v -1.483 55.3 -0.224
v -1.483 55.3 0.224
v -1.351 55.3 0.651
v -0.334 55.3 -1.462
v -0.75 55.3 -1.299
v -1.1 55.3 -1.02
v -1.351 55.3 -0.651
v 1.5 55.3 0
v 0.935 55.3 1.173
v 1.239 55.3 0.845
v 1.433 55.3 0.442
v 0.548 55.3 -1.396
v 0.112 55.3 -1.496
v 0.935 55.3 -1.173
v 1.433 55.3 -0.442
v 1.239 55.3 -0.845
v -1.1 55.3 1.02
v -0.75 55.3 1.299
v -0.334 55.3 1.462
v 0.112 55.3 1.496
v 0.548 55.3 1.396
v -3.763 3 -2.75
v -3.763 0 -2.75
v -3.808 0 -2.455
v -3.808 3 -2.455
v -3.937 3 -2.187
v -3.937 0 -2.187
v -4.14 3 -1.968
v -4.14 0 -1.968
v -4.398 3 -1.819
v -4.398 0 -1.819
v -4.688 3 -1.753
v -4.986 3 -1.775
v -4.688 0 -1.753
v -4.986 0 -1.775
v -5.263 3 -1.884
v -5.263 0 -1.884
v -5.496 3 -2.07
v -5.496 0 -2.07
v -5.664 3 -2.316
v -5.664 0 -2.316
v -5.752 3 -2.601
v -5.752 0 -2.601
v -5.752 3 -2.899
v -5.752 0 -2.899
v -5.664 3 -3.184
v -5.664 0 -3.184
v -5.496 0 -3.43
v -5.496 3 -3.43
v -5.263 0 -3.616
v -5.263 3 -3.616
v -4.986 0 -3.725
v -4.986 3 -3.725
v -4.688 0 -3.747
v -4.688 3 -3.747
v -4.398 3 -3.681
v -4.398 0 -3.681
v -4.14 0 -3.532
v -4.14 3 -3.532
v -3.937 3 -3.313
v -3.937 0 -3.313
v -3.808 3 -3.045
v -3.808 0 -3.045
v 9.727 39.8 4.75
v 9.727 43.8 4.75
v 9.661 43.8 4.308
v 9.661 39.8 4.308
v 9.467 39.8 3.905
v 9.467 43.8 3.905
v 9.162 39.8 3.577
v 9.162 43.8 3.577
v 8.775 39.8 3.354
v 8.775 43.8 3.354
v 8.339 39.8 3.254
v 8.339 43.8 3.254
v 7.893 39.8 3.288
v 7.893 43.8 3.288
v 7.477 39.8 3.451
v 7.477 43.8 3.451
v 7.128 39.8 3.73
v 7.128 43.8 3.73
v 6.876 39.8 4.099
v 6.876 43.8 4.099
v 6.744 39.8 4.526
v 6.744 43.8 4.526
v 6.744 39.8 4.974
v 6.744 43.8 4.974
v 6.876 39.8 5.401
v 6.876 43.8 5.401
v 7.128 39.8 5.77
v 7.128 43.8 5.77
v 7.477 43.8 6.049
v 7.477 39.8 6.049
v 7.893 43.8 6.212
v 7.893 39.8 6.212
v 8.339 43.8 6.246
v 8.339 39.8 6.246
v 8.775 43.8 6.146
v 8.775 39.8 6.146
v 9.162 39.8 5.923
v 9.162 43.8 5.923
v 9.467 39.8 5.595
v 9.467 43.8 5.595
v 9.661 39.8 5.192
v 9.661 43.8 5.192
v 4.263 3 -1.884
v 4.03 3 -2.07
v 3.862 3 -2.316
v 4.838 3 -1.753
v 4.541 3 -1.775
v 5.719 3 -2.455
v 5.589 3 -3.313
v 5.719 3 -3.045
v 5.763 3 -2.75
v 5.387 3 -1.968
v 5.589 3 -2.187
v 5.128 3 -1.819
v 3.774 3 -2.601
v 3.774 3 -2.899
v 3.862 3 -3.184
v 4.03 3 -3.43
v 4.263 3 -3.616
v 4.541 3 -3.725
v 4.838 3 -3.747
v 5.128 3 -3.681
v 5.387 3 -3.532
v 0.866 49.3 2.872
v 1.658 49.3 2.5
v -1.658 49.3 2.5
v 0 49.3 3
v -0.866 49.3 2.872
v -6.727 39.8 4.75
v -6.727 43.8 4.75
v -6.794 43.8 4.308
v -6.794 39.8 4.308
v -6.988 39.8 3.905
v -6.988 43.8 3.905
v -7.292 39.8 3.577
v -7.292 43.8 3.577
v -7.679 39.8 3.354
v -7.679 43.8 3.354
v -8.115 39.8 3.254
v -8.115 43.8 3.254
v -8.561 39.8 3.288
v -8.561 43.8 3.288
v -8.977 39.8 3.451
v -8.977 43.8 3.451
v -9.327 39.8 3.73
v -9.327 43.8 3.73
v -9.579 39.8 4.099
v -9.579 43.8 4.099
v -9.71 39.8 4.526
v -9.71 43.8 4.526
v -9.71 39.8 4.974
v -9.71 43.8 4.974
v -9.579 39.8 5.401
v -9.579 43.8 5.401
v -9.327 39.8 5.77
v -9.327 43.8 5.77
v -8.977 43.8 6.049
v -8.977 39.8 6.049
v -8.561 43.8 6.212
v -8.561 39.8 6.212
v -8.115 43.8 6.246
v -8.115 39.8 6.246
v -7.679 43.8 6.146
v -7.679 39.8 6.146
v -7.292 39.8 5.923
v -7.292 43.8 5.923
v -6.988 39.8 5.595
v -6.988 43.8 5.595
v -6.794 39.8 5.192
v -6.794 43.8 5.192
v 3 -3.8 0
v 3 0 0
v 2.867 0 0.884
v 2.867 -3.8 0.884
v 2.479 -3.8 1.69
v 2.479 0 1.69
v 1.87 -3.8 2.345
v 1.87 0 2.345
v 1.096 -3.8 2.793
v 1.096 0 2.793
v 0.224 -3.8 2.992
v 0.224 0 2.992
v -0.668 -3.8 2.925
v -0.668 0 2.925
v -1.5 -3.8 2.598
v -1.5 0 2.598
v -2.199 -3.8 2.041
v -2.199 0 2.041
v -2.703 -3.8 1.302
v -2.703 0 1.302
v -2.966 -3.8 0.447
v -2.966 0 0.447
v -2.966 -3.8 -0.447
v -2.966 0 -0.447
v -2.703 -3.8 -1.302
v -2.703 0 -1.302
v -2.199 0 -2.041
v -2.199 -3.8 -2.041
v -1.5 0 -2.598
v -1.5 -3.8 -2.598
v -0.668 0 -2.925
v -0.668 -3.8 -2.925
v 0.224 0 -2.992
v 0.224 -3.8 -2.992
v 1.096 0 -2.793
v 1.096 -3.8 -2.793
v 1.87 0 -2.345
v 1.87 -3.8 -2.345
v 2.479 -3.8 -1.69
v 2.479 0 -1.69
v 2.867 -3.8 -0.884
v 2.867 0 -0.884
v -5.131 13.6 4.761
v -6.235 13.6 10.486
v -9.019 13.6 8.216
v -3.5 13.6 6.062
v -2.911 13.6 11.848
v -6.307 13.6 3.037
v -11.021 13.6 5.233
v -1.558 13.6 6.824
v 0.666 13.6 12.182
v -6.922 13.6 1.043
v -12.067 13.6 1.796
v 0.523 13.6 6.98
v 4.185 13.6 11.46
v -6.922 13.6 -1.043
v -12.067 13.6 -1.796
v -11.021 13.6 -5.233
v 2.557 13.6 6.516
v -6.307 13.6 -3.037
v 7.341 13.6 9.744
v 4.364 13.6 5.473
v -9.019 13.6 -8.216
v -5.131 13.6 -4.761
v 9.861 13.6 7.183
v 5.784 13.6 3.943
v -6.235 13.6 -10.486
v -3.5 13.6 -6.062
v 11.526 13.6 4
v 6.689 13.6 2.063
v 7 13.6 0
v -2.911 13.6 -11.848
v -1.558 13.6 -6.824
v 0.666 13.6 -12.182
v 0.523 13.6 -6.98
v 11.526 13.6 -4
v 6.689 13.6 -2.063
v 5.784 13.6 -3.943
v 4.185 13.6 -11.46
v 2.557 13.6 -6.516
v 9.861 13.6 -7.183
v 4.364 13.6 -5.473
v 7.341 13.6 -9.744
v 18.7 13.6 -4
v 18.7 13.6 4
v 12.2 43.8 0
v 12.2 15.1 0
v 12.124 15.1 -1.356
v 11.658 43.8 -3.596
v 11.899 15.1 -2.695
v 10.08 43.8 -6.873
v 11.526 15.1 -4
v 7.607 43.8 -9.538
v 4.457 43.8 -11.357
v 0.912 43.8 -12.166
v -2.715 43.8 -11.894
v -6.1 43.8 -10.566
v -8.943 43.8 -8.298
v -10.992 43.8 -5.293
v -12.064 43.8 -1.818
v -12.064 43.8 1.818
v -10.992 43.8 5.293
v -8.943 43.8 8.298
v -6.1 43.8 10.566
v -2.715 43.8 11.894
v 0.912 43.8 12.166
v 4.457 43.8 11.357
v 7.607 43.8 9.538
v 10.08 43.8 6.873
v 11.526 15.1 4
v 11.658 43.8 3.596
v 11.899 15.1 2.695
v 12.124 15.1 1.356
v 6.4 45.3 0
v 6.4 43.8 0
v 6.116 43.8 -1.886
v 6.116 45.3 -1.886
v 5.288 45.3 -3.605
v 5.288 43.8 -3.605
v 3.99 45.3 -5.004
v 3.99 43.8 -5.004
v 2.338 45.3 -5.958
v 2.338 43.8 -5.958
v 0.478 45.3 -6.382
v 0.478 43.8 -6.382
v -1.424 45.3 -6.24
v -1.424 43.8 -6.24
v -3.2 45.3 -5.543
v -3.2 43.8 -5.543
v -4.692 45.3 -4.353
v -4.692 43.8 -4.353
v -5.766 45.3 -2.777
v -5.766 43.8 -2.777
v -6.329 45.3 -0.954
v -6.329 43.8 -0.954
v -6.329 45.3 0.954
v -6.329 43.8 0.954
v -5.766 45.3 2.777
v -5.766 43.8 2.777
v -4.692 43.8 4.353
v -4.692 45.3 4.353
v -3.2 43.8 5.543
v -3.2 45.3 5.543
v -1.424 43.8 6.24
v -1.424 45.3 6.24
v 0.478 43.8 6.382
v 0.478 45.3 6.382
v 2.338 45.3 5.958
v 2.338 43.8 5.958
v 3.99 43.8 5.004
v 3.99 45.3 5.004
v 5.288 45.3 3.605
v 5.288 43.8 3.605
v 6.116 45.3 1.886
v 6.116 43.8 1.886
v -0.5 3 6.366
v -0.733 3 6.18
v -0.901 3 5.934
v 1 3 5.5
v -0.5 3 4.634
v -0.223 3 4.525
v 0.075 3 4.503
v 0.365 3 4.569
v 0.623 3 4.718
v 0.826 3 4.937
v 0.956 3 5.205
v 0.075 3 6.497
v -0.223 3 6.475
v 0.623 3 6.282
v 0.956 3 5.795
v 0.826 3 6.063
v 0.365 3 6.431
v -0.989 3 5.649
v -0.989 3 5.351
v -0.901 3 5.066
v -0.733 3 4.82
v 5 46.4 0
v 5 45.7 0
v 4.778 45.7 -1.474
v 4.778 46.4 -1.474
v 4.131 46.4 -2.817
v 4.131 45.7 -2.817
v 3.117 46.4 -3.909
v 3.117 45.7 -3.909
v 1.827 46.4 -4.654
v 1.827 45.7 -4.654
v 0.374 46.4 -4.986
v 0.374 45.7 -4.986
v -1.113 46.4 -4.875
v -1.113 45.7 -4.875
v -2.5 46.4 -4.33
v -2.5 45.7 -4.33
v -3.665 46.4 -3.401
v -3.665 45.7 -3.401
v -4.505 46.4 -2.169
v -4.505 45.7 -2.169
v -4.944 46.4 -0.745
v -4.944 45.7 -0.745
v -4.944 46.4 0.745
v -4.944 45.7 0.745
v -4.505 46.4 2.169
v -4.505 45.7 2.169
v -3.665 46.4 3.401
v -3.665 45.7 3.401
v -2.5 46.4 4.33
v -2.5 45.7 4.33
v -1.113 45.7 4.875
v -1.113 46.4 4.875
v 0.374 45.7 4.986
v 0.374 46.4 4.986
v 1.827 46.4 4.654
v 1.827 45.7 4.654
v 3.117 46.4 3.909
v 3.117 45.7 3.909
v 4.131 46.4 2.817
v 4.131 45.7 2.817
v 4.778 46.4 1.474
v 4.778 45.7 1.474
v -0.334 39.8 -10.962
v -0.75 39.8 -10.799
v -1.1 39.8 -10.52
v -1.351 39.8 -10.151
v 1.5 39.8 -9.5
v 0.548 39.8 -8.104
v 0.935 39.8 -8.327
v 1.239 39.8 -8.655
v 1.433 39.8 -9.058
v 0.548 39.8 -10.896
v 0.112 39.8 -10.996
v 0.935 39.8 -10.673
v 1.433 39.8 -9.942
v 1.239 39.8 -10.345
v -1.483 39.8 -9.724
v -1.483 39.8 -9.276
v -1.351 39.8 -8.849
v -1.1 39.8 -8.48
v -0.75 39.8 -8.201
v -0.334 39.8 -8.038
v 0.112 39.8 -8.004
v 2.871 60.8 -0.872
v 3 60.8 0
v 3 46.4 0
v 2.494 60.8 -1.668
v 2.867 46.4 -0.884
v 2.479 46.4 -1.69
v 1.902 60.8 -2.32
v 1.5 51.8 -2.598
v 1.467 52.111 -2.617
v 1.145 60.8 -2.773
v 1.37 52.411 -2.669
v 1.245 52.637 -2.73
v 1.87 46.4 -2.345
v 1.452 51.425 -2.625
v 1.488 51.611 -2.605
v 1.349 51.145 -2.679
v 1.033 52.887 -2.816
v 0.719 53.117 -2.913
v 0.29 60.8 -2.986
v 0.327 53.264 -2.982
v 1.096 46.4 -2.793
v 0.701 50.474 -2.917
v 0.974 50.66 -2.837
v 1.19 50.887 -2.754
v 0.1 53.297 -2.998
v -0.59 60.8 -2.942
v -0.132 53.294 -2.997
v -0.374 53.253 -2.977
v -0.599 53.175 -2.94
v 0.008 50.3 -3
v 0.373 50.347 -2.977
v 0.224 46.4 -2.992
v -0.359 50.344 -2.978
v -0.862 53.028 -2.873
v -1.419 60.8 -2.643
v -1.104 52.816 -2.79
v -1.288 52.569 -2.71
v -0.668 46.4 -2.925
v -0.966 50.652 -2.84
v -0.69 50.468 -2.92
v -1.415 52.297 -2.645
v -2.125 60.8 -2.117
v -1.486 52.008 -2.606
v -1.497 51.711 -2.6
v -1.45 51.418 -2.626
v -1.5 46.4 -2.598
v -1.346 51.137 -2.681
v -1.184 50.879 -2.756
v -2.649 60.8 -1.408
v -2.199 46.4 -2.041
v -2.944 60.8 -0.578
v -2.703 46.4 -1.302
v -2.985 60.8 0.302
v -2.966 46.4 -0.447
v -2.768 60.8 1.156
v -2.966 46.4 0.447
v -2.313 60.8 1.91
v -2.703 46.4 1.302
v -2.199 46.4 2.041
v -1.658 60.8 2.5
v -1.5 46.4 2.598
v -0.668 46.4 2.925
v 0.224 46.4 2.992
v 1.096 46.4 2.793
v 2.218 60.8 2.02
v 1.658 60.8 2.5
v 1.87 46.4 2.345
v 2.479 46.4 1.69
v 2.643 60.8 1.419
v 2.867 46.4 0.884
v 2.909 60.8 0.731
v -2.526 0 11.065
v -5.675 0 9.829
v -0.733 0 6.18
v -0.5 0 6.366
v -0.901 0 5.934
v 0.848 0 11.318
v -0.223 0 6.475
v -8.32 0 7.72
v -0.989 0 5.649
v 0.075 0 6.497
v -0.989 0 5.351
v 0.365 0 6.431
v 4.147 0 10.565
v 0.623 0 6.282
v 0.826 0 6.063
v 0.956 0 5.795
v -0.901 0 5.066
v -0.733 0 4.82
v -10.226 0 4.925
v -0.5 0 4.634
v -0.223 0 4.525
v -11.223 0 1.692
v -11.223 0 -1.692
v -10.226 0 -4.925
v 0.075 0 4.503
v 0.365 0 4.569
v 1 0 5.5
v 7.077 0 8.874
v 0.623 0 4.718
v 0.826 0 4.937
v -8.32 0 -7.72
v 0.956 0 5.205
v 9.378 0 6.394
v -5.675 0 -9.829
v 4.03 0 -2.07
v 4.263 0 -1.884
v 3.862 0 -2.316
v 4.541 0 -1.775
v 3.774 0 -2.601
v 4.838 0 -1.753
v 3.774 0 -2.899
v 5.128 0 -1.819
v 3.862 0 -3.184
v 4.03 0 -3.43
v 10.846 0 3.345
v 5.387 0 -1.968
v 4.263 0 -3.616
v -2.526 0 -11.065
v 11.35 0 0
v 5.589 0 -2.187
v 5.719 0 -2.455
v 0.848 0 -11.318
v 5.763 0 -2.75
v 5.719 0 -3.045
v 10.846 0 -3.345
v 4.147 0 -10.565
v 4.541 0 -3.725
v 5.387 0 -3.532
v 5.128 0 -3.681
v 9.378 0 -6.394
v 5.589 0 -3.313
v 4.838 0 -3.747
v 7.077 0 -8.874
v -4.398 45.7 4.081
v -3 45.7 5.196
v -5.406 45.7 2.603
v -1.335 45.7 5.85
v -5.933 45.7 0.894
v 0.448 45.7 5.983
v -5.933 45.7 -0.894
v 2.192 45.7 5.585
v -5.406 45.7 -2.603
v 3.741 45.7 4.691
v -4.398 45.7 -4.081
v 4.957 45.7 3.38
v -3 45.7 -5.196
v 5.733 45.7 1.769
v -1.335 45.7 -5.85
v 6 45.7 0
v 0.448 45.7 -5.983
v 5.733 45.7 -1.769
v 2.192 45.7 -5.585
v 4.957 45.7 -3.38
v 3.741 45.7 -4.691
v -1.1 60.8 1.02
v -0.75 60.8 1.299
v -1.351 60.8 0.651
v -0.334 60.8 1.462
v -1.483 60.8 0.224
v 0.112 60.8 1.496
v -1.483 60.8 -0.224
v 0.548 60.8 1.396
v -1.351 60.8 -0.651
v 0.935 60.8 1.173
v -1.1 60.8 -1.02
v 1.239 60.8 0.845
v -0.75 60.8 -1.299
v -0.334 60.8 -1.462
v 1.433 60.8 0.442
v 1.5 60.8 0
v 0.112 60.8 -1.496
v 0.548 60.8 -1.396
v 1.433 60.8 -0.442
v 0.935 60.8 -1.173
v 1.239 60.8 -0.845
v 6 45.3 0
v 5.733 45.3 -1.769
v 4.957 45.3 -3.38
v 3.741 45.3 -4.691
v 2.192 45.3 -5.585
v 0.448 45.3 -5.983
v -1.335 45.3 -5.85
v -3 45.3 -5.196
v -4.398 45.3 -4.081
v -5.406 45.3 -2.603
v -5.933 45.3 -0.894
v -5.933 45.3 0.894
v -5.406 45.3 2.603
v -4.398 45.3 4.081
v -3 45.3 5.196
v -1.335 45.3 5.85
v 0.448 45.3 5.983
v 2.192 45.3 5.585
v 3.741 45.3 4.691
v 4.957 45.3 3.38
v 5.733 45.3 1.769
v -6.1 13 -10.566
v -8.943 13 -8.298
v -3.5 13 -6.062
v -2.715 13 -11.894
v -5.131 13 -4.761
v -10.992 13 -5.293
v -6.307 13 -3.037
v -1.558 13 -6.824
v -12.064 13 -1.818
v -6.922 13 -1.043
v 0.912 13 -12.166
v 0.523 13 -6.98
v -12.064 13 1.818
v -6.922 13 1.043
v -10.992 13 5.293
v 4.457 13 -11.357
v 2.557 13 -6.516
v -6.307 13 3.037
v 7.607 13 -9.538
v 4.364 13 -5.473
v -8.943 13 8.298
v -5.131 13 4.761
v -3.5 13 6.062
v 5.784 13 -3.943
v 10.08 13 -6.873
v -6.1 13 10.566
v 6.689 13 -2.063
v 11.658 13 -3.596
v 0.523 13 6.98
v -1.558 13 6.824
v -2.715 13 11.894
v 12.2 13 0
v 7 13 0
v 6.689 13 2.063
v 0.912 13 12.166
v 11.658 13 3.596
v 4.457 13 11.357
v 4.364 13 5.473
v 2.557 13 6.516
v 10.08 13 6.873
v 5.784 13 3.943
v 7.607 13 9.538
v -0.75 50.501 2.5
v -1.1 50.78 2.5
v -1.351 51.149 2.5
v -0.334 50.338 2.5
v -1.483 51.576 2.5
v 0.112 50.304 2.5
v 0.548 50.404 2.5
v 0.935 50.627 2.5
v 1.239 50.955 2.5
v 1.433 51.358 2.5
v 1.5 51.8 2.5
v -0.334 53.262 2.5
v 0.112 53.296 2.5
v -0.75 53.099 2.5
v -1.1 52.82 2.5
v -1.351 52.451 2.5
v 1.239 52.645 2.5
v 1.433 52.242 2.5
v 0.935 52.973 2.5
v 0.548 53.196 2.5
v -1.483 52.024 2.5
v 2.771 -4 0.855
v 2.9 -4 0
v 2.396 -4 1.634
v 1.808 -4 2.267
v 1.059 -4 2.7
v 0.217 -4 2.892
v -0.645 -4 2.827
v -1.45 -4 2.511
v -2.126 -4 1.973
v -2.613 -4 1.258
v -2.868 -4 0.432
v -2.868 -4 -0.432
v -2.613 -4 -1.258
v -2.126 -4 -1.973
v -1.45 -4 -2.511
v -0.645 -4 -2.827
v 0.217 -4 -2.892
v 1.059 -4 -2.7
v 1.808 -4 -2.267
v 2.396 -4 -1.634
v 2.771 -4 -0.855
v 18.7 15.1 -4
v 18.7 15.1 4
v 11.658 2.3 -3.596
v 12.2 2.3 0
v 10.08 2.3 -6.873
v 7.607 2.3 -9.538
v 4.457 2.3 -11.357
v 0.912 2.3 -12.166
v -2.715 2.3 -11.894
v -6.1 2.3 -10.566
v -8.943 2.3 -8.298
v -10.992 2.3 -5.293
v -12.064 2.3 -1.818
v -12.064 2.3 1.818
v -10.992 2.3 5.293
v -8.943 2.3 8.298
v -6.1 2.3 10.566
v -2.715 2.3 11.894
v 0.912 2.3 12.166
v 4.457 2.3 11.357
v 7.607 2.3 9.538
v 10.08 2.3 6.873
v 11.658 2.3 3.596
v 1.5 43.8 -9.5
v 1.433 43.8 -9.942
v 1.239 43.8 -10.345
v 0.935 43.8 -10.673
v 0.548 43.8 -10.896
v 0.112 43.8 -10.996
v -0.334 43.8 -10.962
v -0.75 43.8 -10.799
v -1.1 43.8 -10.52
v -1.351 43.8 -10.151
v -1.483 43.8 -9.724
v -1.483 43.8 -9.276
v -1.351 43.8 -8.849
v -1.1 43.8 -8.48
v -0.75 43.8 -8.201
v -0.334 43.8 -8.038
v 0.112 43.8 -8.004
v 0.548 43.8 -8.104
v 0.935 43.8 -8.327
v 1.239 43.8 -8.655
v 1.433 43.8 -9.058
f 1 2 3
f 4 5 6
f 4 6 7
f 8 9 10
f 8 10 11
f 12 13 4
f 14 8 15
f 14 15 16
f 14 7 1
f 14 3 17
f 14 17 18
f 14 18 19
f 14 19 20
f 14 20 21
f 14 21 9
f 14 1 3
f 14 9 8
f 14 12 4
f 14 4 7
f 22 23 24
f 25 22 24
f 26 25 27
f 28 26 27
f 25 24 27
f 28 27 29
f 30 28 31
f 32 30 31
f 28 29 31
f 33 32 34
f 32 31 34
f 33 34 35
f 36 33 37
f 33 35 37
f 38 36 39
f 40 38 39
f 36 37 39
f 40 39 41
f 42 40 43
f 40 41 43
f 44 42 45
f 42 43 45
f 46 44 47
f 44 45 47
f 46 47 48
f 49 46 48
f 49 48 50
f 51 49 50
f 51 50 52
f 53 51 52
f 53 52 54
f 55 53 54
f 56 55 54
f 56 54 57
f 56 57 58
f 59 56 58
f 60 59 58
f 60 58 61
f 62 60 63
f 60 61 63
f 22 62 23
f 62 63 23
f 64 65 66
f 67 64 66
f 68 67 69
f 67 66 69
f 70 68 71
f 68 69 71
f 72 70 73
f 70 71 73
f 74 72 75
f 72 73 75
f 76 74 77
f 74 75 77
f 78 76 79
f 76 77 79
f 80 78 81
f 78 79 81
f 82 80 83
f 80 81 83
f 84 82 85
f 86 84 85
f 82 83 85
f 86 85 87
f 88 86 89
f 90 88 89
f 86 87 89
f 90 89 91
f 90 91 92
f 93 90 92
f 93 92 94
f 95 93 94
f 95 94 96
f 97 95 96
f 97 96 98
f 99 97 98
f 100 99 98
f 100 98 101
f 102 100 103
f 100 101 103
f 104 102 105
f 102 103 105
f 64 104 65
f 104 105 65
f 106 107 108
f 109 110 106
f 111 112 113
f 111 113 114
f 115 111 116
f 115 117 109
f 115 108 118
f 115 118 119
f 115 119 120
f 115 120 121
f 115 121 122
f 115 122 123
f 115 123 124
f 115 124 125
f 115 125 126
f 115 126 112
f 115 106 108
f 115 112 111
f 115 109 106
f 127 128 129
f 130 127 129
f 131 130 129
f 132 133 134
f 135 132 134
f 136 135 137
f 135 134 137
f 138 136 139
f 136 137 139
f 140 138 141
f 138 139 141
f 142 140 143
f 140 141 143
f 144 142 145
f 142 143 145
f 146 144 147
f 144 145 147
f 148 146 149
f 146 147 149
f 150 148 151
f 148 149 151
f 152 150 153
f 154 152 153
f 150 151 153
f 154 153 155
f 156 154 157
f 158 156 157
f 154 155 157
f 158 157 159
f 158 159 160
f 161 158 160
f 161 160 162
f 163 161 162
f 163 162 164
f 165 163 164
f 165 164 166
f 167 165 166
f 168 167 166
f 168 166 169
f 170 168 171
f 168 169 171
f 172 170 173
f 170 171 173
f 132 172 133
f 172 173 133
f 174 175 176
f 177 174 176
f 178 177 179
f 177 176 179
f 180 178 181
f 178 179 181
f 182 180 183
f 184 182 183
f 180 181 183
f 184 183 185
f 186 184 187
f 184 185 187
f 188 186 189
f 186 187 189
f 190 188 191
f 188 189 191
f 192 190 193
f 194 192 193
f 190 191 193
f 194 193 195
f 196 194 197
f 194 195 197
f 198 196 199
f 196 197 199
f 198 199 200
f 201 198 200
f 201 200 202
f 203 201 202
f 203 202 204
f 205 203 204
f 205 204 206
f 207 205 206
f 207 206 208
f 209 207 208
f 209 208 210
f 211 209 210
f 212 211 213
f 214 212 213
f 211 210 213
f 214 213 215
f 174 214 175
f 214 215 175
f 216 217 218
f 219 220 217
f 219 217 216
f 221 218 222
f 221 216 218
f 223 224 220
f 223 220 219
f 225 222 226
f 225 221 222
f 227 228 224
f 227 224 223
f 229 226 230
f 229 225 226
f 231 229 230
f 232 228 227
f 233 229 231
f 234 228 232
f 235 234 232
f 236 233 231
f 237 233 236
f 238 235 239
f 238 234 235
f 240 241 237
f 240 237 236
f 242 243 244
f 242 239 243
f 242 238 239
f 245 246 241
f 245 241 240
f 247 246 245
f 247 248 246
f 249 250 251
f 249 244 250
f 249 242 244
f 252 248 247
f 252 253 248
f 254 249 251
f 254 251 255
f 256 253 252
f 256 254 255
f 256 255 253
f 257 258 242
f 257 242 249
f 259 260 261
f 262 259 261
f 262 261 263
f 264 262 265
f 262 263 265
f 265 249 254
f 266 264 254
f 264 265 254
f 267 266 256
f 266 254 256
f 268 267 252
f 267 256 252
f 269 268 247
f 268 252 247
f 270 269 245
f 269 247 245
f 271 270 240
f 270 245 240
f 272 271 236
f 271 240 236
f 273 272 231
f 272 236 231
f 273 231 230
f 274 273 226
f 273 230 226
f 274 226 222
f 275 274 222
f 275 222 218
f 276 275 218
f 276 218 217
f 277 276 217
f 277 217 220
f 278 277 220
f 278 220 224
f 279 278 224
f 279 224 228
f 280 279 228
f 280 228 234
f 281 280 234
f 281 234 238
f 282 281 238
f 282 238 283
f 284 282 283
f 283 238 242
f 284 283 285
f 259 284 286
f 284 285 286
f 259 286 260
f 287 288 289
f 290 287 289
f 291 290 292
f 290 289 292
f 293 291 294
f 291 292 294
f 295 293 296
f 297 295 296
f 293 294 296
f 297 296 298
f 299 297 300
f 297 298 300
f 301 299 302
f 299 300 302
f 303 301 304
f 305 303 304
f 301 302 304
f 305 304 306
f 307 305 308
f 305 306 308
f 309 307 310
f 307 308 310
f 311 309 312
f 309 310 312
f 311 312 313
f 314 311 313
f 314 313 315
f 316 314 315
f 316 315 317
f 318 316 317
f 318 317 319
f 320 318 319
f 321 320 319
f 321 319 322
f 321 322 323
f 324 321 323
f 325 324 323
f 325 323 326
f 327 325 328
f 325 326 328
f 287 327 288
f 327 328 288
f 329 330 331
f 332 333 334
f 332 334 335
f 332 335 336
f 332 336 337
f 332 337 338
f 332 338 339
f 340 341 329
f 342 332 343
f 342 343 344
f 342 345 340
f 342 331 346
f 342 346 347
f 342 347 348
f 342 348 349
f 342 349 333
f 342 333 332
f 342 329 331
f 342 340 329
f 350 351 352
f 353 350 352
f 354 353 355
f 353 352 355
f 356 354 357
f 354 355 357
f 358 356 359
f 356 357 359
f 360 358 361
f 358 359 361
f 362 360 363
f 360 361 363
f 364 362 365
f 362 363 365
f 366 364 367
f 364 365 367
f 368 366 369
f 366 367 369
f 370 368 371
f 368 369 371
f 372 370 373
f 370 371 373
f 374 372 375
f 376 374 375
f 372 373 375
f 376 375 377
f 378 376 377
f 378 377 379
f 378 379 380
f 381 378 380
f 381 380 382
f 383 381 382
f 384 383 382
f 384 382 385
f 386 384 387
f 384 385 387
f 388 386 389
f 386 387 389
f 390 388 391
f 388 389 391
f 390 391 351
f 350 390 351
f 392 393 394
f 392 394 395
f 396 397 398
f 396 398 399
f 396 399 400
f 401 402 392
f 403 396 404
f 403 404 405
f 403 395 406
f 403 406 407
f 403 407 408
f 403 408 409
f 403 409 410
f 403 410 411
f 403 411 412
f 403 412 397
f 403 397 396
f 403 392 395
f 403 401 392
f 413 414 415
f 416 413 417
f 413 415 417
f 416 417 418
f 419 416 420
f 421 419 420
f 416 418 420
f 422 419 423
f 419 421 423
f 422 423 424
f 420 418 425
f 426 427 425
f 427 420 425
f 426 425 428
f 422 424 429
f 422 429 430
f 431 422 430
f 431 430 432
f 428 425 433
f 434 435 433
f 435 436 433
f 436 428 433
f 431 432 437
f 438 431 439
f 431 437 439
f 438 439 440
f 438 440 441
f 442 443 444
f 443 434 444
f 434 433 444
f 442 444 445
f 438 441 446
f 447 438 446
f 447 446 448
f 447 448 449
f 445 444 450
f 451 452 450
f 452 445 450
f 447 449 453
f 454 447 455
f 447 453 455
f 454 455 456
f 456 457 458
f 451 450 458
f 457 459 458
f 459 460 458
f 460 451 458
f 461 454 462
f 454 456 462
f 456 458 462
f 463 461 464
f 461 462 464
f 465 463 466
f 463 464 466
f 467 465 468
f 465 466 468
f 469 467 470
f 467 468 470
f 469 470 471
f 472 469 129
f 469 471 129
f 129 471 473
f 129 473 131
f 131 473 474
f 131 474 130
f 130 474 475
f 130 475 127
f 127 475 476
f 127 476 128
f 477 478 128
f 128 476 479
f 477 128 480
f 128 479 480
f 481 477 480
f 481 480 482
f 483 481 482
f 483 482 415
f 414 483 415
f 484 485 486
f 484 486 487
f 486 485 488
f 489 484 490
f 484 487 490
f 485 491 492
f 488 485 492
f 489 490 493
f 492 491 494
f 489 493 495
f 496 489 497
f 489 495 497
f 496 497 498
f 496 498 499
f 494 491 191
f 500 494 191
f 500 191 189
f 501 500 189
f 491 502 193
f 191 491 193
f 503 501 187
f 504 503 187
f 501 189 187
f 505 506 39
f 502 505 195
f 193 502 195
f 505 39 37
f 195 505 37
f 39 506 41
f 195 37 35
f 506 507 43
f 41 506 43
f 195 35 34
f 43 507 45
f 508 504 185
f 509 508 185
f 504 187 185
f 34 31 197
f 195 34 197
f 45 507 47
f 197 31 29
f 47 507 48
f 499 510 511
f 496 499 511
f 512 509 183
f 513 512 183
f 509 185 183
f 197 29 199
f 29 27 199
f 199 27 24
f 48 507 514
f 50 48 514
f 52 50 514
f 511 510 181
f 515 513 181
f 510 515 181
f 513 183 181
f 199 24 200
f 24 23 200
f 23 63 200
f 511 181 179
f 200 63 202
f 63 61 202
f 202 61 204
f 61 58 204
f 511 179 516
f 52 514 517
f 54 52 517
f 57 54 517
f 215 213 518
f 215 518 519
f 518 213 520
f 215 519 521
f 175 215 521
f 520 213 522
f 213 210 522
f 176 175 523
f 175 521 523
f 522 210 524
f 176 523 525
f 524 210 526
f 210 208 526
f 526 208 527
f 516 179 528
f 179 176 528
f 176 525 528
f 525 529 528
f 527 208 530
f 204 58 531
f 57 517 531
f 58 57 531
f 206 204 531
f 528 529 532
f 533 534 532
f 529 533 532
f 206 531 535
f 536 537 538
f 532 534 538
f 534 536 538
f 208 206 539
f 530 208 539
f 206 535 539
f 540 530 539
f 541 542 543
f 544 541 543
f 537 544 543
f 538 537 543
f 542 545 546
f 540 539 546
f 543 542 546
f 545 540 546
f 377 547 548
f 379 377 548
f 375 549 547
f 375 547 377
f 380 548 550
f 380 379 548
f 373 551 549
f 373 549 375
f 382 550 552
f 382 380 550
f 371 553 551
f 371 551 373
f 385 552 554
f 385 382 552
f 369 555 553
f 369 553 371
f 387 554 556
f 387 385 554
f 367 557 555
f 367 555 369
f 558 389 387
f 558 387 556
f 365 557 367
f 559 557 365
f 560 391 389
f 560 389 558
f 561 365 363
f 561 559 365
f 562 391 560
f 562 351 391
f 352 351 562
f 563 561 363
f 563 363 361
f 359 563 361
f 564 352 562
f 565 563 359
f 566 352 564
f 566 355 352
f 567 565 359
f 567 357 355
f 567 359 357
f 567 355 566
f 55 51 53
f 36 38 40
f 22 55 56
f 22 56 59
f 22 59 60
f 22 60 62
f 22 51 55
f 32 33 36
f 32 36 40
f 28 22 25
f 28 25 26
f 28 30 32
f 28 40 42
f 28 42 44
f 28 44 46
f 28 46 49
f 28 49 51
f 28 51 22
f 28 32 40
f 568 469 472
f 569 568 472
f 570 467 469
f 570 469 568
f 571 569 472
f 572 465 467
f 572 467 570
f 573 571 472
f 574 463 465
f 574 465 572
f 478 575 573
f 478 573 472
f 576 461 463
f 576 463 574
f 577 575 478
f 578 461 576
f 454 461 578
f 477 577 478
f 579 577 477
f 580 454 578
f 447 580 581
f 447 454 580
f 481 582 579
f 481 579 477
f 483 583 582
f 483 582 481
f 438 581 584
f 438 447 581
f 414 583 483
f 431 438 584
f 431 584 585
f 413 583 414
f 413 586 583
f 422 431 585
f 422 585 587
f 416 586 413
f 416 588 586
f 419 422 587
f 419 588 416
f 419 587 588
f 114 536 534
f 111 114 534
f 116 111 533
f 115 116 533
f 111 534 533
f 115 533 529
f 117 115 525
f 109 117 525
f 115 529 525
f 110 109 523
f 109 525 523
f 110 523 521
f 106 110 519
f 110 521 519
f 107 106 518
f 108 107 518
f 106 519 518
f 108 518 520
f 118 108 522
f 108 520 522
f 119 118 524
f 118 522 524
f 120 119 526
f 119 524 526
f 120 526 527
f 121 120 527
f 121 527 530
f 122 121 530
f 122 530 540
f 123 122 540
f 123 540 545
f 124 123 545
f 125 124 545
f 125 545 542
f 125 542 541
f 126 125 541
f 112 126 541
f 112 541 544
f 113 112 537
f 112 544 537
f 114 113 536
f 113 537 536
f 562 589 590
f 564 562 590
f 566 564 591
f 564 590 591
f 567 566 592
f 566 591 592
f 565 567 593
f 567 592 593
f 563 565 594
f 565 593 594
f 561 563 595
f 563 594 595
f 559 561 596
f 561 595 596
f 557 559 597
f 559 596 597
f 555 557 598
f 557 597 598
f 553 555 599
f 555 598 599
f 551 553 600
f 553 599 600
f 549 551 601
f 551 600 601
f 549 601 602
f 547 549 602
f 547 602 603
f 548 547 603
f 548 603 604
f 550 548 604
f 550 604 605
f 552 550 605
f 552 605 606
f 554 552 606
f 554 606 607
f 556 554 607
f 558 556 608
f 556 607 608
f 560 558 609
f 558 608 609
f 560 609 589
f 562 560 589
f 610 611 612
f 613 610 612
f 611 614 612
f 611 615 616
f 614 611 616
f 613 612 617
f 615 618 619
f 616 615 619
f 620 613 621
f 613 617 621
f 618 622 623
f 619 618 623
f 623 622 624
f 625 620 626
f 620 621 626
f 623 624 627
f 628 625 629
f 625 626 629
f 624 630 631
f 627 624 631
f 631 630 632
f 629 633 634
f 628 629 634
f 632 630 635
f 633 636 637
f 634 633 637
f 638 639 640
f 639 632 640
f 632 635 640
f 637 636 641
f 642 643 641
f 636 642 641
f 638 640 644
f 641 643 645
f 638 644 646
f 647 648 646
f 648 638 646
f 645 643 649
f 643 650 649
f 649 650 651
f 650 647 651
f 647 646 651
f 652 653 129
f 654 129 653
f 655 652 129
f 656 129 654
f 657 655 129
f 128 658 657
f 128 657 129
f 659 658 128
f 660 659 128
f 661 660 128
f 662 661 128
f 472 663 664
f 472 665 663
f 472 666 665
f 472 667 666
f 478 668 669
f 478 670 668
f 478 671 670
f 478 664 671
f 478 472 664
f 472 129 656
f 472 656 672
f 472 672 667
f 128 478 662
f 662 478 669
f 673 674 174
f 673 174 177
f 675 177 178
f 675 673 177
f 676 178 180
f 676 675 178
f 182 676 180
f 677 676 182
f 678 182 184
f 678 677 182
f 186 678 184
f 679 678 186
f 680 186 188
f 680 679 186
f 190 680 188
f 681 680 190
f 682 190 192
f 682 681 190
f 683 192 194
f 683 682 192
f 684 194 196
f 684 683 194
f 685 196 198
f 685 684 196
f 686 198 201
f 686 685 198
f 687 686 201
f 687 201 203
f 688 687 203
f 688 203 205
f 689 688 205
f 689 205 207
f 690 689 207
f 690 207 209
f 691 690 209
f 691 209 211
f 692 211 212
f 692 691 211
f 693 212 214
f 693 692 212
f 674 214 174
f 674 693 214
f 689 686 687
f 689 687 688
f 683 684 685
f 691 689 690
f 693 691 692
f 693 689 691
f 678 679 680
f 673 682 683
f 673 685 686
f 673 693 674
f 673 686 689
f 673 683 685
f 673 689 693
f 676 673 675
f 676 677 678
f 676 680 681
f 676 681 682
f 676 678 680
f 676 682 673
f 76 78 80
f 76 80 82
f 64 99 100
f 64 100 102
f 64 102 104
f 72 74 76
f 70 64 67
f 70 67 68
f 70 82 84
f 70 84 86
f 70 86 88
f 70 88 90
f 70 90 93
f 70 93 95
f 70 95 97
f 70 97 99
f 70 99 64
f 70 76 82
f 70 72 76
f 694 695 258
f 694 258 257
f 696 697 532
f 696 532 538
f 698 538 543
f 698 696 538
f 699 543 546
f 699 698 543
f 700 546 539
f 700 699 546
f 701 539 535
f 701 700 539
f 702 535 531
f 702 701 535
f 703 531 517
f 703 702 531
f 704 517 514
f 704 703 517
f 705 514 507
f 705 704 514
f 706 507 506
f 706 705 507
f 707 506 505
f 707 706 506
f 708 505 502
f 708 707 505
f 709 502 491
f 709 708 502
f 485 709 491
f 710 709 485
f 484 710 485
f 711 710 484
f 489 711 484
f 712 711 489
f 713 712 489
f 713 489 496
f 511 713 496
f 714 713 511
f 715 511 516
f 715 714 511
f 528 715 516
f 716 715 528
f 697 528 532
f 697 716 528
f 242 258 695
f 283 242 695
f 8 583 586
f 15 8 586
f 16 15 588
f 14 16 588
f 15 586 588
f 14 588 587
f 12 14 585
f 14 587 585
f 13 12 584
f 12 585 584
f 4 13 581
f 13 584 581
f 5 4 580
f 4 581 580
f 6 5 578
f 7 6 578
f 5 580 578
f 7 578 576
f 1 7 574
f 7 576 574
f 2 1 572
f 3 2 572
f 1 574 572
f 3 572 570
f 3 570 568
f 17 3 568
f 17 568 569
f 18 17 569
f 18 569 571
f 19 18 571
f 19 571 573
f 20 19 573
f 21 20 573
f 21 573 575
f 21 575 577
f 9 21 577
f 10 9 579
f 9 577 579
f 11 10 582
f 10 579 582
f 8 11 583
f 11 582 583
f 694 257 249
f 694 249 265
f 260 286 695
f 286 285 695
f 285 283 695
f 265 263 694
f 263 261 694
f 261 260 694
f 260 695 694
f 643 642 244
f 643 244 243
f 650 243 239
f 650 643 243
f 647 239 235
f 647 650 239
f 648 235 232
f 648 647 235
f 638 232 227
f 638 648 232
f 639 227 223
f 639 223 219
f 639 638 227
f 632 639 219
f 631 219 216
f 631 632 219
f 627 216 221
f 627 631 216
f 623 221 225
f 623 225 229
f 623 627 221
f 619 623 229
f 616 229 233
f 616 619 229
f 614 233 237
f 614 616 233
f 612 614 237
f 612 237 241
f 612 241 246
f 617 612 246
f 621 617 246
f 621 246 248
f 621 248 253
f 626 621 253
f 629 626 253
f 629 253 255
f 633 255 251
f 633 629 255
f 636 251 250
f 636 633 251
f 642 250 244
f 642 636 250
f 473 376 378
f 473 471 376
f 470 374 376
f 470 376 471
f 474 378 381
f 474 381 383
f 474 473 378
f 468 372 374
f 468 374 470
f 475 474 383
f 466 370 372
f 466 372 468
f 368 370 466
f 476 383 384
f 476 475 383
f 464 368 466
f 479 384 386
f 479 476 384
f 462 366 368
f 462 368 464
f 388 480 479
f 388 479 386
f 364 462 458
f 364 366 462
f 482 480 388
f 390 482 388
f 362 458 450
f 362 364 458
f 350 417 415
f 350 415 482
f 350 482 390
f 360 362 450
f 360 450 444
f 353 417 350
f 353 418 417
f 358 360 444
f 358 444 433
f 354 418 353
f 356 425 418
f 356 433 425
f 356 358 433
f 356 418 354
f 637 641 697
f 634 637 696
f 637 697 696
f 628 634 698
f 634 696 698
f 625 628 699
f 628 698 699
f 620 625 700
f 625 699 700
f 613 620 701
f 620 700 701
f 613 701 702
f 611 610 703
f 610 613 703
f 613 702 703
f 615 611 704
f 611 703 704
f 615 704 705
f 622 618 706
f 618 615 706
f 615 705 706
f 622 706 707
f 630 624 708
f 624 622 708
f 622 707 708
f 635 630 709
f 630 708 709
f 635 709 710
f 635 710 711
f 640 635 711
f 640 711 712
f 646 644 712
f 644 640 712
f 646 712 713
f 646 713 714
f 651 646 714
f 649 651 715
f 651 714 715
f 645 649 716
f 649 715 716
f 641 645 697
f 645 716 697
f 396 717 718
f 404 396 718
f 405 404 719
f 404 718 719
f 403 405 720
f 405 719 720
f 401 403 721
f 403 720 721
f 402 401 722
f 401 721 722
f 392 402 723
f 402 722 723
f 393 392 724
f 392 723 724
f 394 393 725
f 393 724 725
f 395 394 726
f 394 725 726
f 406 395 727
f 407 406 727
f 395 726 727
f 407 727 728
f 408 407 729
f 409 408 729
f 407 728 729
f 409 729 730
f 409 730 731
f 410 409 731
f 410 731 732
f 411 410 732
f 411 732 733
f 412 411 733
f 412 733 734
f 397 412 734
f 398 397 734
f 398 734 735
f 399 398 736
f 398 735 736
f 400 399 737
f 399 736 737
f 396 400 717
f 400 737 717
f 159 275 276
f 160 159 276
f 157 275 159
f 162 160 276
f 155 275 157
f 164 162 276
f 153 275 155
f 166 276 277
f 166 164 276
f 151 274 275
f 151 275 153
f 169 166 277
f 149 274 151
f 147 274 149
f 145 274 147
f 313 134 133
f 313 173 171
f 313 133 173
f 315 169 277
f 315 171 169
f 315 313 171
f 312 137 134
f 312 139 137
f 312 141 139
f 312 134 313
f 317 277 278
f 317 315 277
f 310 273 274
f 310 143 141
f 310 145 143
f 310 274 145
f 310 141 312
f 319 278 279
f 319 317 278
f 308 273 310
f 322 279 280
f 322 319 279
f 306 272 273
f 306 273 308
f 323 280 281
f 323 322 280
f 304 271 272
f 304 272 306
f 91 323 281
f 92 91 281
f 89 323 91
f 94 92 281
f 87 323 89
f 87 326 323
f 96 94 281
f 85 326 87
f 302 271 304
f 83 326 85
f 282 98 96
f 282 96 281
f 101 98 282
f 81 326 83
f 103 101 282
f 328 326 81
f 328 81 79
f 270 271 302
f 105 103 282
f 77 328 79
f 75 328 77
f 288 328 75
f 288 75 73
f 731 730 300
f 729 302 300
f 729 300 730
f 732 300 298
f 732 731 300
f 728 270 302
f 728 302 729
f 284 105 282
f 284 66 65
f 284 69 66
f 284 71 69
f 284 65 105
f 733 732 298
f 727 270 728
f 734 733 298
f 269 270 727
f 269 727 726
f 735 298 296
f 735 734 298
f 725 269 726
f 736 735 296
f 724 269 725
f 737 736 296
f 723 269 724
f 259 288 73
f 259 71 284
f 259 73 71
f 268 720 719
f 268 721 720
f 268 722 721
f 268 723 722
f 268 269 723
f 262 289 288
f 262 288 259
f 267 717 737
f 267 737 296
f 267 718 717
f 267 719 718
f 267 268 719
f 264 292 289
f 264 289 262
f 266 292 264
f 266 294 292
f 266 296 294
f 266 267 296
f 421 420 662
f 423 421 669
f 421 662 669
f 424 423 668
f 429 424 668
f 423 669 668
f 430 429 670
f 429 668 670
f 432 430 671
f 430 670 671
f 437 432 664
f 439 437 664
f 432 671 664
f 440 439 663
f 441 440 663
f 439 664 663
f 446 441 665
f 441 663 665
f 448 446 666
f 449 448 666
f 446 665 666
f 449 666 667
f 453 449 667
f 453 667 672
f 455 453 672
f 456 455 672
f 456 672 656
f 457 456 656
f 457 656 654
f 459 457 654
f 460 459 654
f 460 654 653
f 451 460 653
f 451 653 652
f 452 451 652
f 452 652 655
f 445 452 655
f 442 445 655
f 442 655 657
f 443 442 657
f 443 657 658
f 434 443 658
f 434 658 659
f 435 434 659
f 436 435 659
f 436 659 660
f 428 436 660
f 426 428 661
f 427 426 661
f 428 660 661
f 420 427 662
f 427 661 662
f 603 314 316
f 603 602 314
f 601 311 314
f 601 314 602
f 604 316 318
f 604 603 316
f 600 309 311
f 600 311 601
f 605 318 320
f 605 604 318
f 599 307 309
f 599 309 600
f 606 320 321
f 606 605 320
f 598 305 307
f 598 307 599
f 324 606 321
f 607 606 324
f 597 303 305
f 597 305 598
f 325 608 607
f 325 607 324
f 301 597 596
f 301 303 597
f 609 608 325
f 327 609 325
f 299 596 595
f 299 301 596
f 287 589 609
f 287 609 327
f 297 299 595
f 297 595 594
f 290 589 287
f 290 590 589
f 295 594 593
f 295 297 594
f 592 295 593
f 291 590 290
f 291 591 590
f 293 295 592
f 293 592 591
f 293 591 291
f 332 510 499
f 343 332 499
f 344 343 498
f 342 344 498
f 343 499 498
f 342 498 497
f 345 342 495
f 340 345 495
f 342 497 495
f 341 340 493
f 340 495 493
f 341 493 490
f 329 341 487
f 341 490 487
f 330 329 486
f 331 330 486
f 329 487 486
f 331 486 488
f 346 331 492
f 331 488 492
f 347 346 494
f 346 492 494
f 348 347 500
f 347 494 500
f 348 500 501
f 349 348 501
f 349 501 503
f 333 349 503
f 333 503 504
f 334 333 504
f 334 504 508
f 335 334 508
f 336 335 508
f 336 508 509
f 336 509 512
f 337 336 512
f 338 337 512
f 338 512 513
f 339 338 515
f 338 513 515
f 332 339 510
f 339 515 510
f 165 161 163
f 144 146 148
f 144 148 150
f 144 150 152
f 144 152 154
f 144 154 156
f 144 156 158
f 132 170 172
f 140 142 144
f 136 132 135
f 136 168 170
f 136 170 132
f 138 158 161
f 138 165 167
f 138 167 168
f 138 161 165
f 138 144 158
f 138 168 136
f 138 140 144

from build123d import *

# Parameters (mm, degrees)
SKETCH_1_R          = 12.2
EXTRUDE_1_DEPTH     = 43.8
SKETCH_3_R          = 1.5
CUT_EXTRUDE_1_DEPTH = 4
CHAMFER_1_SIZE      = 0.85
CHAMFER_1_SIZE2     = 2.3
SKETCH_4_R          = 6.4
EXTRUDE_2_DEPTH     = 1.5
SKETCH_5_R          = 6
EXTRUDE_3_DEPTH     = 0.4
SKETCH_6_R          = 5
EXTRUDE_4_DEPTH     = 0.7
SKETCH_7_R          = 3
EXTRUDE_5_DEPTH     = 14.4
SKETCH_8_R          = 1.5
CUT_EXTRUDE_2_DEPTH = 5.5
CUT_EXTRUDE_3_DEPTH = 11.5
SKETCH_10_R         = 1.5
CUT_EXTRUDE_4_DEPTH = 15.7
CUT_EXTRUDE_START   = -13
SKETCH_11_R         = 12.2
SKETCH_11_R_2       = 7
CUT_EXTRUDE_5_DEPTH = 0.6
EXTRUDE_6_REACH     = 32.9
SKETCH_12_W         = 8
SKETCH_12_H         = 1.5
SKETCH_13_R         = 1
CUT_EXTRUDE_6_DEPTH = 3
SKETCH_14_R         = 3
EXTRUDE_7_DEPTH     = 4
CHAMFER_2_SIZE      = 0.2
CHAMFER_2_SIZE2     = 0.1


with BuildPart() as part:
    # 草图1 → 凸台-拉伸1 (new body)
    with BuildSketch(Plane(origin=(0, 0, 0), x_dir=(1, 0, 0), z_dir=(0, 1, 0))):
        Circle(SKETCH_1_R)
    extrude(amount=EXTRUDE_1_DEPTH)

    # 草图3 → 切除-拉伸1 (cut)
    with BuildSketch(Plane(origin=(0, 43.8, 0), x_dir=(1, 0, 0), z_dir=(0, 1, 0))):
        with Locations((0, 9.5)):
            Circle(SKETCH_3_R)
        with Locations((-8.227241336, -4.75)):
            Circle(SKETCH_3_R)
        with Locations((8.227241336, -4.75)):
            Circle(SKETCH_3_R)
    extrude(amount=-CUT_EXTRUDE_1_DEPTH, mode=Mode.SUBTRACT)

    # 倒角1
    chamfer_1_edges = [part.edges().sort_by_distance(p)[0] for p in [
        (-12.2, 0, 0),
    ]]
    chamfer_1_side = [part.faces().sort_by_distance(p)[0] for p in [
        (0, 0, 0),
    ]]
    chamfer(chamfer_1_edges, length=CHAMFER_1_SIZE, length2=CHAMFER_1_SIZE2, reference=chamfer_1_side[0])

    # 草图4 → 凸台-拉伸2 (add)
    with BuildSketch(Plane(origin=(0, 43.8, 0), x_dir=(1, 0, 0), z_dir=(0, 1, 0))):
        Circle(SKETCH_4_R)
    extrude(amount=EXTRUDE_2_DEPTH)

    # 草图5 → 凸台-拉伸3 (add)
    with BuildSketch(Plane(origin=(0, 45.3, 0), x_dir=(1, 0, 0), z_dir=(0, 1, 0))):
        Circle(SKETCH_5_R)
    extrude(amount=EXTRUDE_3_DEPTH)

    # 草图6 → 凸台-拉伸4 (add)
    with BuildSketch(Plane(origin=(0, 45.7, 0), x_dir=(1, 0, 0), z_dir=(0, 1, 0))):
        Circle(SKETCH_6_R)
    extrude(amount=EXTRUDE_4_DEPTH)

    # 草图7 → 凸台-拉伸5 (add)
    with BuildSketch(Plane(origin=(0, 46.4, 0), x_dir=(1, 0, 0), z_dir=(0, 1, 0))):
        Circle(SKETCH_7_R)
    extrude(amount=EXTRUDE_5_DEPTH)

    # 草图8 → 切除-拉伸2 (cut)
    with BuildSketch(Plane(origin=(0, 60.8, 0), x_dir=(1, 0, 0), z_dir=(0, 1, 0))):
        Circle(SKETCH_8_R)
    extrude(amount=-CUT_EXTRUDE_2_DEPTH, mode=Mode.SUBTRACT)

    # 草图9 → 切除-拉伸3 (cut)
    with BuildSketch(Plane(origin=(0, 60.8, 0), x_dir=(1, 0, 0), z_dir=(0, 1, 0))):
        with BuildLine():
            Line((-1.658312395, -2.5), (1.658312395, -2.5))
            ThreePointArc((1.658312395, -2.5), (0, -3), (-1.658312395, -2.5))
        make_face()
    extrude(amount=-CUT_EXTRUDE_3_DEPTH, mode=Mode.SUBTRACT)

    # 草图10 → 切除-拉伸4 (cut, through all)
    with BuildSketch(Plane.XY.offset(2.5)):
        with Locations((0, 51.8)):
            Circle(SKETCH_10_R)
    extrude(amount=-CUT_EXTRUDE_4_DEPTH, mode=Mode.SUBTRACT)

    # 草图11 → 切除-拉伸5 (cut)
    with BuildSketch(Plane.XZ.offset(CUT_EXTRUDE_START)):
        Circle(SKETCH_11_R)
        Circle(SKETCH_11_R_2, mode=Mode.SUBTRACT)
    extrude(amount=-CUT_EXTRUDE_5_DEPTH, mode=Mode.SUBTRACT)

    # 草图12 → 凸台-拉伸6 (add, up to next)
    with BuildSketch(Plane(origin=(18.7, 0, 0), x_dir=(0, 0, -1), z_dir=(1, 0, 0)), mode=Mode.PRIVATE) as extrude_6_sk1:
        with Locations((0, 14.35)):
            Rectangle(SKETCH_12_W, SKETCH_12_H)
    extrude_6_tool1 = extrude(extrude_6_sk1.sketch, amount=-EXTRUDE_6_REACH, mode=Mode.PRIVATE) - part.part
    add(extrude_6_tool1.solids().sort_by_distance((18.7, 14.35, 0))[0])

    # 草图13 → 切除-拉伸6 (cut)
    with BuildSketch(Plane.XZ):
        with Locations((0, 5.5)):
            Circle(SKETCH_13_R)
        with Locations((-4.763139721, -2.75)):
            Circle(SKETCH_13_R)
        with Locations((4.763139721, -2.75)):
            Circle(SKETCH_13_R)
    extrude(amount=-CUT_EXTRUDE_6_DEPTH, mode=Mode.SUBTRACT)

    # 草图14 → 凸台-拉伸7 (add)
    with BuildSketch(Plane.XZ):
        Circle(SKETCH_14_R)
    extrude(amount=EXTRUDE_7_DEPTH)

    # 倒角2
    chamfer_2_edges = [part.edges().sort_by_distance(p)[0] for p in [
        (-3, -4, 0),
    ]]
    chamfer_2_side = [part.faces().sort_by_distance(p)[0] for p in [
        (-3, -2, 0),
    ]]
    chamfer(chamfer_2_edges, length=CHAMFER_2_SIZE, length2=CHAMFER_2_SIZE2, reference=chamfer_2_side[0])


solid = part.part
